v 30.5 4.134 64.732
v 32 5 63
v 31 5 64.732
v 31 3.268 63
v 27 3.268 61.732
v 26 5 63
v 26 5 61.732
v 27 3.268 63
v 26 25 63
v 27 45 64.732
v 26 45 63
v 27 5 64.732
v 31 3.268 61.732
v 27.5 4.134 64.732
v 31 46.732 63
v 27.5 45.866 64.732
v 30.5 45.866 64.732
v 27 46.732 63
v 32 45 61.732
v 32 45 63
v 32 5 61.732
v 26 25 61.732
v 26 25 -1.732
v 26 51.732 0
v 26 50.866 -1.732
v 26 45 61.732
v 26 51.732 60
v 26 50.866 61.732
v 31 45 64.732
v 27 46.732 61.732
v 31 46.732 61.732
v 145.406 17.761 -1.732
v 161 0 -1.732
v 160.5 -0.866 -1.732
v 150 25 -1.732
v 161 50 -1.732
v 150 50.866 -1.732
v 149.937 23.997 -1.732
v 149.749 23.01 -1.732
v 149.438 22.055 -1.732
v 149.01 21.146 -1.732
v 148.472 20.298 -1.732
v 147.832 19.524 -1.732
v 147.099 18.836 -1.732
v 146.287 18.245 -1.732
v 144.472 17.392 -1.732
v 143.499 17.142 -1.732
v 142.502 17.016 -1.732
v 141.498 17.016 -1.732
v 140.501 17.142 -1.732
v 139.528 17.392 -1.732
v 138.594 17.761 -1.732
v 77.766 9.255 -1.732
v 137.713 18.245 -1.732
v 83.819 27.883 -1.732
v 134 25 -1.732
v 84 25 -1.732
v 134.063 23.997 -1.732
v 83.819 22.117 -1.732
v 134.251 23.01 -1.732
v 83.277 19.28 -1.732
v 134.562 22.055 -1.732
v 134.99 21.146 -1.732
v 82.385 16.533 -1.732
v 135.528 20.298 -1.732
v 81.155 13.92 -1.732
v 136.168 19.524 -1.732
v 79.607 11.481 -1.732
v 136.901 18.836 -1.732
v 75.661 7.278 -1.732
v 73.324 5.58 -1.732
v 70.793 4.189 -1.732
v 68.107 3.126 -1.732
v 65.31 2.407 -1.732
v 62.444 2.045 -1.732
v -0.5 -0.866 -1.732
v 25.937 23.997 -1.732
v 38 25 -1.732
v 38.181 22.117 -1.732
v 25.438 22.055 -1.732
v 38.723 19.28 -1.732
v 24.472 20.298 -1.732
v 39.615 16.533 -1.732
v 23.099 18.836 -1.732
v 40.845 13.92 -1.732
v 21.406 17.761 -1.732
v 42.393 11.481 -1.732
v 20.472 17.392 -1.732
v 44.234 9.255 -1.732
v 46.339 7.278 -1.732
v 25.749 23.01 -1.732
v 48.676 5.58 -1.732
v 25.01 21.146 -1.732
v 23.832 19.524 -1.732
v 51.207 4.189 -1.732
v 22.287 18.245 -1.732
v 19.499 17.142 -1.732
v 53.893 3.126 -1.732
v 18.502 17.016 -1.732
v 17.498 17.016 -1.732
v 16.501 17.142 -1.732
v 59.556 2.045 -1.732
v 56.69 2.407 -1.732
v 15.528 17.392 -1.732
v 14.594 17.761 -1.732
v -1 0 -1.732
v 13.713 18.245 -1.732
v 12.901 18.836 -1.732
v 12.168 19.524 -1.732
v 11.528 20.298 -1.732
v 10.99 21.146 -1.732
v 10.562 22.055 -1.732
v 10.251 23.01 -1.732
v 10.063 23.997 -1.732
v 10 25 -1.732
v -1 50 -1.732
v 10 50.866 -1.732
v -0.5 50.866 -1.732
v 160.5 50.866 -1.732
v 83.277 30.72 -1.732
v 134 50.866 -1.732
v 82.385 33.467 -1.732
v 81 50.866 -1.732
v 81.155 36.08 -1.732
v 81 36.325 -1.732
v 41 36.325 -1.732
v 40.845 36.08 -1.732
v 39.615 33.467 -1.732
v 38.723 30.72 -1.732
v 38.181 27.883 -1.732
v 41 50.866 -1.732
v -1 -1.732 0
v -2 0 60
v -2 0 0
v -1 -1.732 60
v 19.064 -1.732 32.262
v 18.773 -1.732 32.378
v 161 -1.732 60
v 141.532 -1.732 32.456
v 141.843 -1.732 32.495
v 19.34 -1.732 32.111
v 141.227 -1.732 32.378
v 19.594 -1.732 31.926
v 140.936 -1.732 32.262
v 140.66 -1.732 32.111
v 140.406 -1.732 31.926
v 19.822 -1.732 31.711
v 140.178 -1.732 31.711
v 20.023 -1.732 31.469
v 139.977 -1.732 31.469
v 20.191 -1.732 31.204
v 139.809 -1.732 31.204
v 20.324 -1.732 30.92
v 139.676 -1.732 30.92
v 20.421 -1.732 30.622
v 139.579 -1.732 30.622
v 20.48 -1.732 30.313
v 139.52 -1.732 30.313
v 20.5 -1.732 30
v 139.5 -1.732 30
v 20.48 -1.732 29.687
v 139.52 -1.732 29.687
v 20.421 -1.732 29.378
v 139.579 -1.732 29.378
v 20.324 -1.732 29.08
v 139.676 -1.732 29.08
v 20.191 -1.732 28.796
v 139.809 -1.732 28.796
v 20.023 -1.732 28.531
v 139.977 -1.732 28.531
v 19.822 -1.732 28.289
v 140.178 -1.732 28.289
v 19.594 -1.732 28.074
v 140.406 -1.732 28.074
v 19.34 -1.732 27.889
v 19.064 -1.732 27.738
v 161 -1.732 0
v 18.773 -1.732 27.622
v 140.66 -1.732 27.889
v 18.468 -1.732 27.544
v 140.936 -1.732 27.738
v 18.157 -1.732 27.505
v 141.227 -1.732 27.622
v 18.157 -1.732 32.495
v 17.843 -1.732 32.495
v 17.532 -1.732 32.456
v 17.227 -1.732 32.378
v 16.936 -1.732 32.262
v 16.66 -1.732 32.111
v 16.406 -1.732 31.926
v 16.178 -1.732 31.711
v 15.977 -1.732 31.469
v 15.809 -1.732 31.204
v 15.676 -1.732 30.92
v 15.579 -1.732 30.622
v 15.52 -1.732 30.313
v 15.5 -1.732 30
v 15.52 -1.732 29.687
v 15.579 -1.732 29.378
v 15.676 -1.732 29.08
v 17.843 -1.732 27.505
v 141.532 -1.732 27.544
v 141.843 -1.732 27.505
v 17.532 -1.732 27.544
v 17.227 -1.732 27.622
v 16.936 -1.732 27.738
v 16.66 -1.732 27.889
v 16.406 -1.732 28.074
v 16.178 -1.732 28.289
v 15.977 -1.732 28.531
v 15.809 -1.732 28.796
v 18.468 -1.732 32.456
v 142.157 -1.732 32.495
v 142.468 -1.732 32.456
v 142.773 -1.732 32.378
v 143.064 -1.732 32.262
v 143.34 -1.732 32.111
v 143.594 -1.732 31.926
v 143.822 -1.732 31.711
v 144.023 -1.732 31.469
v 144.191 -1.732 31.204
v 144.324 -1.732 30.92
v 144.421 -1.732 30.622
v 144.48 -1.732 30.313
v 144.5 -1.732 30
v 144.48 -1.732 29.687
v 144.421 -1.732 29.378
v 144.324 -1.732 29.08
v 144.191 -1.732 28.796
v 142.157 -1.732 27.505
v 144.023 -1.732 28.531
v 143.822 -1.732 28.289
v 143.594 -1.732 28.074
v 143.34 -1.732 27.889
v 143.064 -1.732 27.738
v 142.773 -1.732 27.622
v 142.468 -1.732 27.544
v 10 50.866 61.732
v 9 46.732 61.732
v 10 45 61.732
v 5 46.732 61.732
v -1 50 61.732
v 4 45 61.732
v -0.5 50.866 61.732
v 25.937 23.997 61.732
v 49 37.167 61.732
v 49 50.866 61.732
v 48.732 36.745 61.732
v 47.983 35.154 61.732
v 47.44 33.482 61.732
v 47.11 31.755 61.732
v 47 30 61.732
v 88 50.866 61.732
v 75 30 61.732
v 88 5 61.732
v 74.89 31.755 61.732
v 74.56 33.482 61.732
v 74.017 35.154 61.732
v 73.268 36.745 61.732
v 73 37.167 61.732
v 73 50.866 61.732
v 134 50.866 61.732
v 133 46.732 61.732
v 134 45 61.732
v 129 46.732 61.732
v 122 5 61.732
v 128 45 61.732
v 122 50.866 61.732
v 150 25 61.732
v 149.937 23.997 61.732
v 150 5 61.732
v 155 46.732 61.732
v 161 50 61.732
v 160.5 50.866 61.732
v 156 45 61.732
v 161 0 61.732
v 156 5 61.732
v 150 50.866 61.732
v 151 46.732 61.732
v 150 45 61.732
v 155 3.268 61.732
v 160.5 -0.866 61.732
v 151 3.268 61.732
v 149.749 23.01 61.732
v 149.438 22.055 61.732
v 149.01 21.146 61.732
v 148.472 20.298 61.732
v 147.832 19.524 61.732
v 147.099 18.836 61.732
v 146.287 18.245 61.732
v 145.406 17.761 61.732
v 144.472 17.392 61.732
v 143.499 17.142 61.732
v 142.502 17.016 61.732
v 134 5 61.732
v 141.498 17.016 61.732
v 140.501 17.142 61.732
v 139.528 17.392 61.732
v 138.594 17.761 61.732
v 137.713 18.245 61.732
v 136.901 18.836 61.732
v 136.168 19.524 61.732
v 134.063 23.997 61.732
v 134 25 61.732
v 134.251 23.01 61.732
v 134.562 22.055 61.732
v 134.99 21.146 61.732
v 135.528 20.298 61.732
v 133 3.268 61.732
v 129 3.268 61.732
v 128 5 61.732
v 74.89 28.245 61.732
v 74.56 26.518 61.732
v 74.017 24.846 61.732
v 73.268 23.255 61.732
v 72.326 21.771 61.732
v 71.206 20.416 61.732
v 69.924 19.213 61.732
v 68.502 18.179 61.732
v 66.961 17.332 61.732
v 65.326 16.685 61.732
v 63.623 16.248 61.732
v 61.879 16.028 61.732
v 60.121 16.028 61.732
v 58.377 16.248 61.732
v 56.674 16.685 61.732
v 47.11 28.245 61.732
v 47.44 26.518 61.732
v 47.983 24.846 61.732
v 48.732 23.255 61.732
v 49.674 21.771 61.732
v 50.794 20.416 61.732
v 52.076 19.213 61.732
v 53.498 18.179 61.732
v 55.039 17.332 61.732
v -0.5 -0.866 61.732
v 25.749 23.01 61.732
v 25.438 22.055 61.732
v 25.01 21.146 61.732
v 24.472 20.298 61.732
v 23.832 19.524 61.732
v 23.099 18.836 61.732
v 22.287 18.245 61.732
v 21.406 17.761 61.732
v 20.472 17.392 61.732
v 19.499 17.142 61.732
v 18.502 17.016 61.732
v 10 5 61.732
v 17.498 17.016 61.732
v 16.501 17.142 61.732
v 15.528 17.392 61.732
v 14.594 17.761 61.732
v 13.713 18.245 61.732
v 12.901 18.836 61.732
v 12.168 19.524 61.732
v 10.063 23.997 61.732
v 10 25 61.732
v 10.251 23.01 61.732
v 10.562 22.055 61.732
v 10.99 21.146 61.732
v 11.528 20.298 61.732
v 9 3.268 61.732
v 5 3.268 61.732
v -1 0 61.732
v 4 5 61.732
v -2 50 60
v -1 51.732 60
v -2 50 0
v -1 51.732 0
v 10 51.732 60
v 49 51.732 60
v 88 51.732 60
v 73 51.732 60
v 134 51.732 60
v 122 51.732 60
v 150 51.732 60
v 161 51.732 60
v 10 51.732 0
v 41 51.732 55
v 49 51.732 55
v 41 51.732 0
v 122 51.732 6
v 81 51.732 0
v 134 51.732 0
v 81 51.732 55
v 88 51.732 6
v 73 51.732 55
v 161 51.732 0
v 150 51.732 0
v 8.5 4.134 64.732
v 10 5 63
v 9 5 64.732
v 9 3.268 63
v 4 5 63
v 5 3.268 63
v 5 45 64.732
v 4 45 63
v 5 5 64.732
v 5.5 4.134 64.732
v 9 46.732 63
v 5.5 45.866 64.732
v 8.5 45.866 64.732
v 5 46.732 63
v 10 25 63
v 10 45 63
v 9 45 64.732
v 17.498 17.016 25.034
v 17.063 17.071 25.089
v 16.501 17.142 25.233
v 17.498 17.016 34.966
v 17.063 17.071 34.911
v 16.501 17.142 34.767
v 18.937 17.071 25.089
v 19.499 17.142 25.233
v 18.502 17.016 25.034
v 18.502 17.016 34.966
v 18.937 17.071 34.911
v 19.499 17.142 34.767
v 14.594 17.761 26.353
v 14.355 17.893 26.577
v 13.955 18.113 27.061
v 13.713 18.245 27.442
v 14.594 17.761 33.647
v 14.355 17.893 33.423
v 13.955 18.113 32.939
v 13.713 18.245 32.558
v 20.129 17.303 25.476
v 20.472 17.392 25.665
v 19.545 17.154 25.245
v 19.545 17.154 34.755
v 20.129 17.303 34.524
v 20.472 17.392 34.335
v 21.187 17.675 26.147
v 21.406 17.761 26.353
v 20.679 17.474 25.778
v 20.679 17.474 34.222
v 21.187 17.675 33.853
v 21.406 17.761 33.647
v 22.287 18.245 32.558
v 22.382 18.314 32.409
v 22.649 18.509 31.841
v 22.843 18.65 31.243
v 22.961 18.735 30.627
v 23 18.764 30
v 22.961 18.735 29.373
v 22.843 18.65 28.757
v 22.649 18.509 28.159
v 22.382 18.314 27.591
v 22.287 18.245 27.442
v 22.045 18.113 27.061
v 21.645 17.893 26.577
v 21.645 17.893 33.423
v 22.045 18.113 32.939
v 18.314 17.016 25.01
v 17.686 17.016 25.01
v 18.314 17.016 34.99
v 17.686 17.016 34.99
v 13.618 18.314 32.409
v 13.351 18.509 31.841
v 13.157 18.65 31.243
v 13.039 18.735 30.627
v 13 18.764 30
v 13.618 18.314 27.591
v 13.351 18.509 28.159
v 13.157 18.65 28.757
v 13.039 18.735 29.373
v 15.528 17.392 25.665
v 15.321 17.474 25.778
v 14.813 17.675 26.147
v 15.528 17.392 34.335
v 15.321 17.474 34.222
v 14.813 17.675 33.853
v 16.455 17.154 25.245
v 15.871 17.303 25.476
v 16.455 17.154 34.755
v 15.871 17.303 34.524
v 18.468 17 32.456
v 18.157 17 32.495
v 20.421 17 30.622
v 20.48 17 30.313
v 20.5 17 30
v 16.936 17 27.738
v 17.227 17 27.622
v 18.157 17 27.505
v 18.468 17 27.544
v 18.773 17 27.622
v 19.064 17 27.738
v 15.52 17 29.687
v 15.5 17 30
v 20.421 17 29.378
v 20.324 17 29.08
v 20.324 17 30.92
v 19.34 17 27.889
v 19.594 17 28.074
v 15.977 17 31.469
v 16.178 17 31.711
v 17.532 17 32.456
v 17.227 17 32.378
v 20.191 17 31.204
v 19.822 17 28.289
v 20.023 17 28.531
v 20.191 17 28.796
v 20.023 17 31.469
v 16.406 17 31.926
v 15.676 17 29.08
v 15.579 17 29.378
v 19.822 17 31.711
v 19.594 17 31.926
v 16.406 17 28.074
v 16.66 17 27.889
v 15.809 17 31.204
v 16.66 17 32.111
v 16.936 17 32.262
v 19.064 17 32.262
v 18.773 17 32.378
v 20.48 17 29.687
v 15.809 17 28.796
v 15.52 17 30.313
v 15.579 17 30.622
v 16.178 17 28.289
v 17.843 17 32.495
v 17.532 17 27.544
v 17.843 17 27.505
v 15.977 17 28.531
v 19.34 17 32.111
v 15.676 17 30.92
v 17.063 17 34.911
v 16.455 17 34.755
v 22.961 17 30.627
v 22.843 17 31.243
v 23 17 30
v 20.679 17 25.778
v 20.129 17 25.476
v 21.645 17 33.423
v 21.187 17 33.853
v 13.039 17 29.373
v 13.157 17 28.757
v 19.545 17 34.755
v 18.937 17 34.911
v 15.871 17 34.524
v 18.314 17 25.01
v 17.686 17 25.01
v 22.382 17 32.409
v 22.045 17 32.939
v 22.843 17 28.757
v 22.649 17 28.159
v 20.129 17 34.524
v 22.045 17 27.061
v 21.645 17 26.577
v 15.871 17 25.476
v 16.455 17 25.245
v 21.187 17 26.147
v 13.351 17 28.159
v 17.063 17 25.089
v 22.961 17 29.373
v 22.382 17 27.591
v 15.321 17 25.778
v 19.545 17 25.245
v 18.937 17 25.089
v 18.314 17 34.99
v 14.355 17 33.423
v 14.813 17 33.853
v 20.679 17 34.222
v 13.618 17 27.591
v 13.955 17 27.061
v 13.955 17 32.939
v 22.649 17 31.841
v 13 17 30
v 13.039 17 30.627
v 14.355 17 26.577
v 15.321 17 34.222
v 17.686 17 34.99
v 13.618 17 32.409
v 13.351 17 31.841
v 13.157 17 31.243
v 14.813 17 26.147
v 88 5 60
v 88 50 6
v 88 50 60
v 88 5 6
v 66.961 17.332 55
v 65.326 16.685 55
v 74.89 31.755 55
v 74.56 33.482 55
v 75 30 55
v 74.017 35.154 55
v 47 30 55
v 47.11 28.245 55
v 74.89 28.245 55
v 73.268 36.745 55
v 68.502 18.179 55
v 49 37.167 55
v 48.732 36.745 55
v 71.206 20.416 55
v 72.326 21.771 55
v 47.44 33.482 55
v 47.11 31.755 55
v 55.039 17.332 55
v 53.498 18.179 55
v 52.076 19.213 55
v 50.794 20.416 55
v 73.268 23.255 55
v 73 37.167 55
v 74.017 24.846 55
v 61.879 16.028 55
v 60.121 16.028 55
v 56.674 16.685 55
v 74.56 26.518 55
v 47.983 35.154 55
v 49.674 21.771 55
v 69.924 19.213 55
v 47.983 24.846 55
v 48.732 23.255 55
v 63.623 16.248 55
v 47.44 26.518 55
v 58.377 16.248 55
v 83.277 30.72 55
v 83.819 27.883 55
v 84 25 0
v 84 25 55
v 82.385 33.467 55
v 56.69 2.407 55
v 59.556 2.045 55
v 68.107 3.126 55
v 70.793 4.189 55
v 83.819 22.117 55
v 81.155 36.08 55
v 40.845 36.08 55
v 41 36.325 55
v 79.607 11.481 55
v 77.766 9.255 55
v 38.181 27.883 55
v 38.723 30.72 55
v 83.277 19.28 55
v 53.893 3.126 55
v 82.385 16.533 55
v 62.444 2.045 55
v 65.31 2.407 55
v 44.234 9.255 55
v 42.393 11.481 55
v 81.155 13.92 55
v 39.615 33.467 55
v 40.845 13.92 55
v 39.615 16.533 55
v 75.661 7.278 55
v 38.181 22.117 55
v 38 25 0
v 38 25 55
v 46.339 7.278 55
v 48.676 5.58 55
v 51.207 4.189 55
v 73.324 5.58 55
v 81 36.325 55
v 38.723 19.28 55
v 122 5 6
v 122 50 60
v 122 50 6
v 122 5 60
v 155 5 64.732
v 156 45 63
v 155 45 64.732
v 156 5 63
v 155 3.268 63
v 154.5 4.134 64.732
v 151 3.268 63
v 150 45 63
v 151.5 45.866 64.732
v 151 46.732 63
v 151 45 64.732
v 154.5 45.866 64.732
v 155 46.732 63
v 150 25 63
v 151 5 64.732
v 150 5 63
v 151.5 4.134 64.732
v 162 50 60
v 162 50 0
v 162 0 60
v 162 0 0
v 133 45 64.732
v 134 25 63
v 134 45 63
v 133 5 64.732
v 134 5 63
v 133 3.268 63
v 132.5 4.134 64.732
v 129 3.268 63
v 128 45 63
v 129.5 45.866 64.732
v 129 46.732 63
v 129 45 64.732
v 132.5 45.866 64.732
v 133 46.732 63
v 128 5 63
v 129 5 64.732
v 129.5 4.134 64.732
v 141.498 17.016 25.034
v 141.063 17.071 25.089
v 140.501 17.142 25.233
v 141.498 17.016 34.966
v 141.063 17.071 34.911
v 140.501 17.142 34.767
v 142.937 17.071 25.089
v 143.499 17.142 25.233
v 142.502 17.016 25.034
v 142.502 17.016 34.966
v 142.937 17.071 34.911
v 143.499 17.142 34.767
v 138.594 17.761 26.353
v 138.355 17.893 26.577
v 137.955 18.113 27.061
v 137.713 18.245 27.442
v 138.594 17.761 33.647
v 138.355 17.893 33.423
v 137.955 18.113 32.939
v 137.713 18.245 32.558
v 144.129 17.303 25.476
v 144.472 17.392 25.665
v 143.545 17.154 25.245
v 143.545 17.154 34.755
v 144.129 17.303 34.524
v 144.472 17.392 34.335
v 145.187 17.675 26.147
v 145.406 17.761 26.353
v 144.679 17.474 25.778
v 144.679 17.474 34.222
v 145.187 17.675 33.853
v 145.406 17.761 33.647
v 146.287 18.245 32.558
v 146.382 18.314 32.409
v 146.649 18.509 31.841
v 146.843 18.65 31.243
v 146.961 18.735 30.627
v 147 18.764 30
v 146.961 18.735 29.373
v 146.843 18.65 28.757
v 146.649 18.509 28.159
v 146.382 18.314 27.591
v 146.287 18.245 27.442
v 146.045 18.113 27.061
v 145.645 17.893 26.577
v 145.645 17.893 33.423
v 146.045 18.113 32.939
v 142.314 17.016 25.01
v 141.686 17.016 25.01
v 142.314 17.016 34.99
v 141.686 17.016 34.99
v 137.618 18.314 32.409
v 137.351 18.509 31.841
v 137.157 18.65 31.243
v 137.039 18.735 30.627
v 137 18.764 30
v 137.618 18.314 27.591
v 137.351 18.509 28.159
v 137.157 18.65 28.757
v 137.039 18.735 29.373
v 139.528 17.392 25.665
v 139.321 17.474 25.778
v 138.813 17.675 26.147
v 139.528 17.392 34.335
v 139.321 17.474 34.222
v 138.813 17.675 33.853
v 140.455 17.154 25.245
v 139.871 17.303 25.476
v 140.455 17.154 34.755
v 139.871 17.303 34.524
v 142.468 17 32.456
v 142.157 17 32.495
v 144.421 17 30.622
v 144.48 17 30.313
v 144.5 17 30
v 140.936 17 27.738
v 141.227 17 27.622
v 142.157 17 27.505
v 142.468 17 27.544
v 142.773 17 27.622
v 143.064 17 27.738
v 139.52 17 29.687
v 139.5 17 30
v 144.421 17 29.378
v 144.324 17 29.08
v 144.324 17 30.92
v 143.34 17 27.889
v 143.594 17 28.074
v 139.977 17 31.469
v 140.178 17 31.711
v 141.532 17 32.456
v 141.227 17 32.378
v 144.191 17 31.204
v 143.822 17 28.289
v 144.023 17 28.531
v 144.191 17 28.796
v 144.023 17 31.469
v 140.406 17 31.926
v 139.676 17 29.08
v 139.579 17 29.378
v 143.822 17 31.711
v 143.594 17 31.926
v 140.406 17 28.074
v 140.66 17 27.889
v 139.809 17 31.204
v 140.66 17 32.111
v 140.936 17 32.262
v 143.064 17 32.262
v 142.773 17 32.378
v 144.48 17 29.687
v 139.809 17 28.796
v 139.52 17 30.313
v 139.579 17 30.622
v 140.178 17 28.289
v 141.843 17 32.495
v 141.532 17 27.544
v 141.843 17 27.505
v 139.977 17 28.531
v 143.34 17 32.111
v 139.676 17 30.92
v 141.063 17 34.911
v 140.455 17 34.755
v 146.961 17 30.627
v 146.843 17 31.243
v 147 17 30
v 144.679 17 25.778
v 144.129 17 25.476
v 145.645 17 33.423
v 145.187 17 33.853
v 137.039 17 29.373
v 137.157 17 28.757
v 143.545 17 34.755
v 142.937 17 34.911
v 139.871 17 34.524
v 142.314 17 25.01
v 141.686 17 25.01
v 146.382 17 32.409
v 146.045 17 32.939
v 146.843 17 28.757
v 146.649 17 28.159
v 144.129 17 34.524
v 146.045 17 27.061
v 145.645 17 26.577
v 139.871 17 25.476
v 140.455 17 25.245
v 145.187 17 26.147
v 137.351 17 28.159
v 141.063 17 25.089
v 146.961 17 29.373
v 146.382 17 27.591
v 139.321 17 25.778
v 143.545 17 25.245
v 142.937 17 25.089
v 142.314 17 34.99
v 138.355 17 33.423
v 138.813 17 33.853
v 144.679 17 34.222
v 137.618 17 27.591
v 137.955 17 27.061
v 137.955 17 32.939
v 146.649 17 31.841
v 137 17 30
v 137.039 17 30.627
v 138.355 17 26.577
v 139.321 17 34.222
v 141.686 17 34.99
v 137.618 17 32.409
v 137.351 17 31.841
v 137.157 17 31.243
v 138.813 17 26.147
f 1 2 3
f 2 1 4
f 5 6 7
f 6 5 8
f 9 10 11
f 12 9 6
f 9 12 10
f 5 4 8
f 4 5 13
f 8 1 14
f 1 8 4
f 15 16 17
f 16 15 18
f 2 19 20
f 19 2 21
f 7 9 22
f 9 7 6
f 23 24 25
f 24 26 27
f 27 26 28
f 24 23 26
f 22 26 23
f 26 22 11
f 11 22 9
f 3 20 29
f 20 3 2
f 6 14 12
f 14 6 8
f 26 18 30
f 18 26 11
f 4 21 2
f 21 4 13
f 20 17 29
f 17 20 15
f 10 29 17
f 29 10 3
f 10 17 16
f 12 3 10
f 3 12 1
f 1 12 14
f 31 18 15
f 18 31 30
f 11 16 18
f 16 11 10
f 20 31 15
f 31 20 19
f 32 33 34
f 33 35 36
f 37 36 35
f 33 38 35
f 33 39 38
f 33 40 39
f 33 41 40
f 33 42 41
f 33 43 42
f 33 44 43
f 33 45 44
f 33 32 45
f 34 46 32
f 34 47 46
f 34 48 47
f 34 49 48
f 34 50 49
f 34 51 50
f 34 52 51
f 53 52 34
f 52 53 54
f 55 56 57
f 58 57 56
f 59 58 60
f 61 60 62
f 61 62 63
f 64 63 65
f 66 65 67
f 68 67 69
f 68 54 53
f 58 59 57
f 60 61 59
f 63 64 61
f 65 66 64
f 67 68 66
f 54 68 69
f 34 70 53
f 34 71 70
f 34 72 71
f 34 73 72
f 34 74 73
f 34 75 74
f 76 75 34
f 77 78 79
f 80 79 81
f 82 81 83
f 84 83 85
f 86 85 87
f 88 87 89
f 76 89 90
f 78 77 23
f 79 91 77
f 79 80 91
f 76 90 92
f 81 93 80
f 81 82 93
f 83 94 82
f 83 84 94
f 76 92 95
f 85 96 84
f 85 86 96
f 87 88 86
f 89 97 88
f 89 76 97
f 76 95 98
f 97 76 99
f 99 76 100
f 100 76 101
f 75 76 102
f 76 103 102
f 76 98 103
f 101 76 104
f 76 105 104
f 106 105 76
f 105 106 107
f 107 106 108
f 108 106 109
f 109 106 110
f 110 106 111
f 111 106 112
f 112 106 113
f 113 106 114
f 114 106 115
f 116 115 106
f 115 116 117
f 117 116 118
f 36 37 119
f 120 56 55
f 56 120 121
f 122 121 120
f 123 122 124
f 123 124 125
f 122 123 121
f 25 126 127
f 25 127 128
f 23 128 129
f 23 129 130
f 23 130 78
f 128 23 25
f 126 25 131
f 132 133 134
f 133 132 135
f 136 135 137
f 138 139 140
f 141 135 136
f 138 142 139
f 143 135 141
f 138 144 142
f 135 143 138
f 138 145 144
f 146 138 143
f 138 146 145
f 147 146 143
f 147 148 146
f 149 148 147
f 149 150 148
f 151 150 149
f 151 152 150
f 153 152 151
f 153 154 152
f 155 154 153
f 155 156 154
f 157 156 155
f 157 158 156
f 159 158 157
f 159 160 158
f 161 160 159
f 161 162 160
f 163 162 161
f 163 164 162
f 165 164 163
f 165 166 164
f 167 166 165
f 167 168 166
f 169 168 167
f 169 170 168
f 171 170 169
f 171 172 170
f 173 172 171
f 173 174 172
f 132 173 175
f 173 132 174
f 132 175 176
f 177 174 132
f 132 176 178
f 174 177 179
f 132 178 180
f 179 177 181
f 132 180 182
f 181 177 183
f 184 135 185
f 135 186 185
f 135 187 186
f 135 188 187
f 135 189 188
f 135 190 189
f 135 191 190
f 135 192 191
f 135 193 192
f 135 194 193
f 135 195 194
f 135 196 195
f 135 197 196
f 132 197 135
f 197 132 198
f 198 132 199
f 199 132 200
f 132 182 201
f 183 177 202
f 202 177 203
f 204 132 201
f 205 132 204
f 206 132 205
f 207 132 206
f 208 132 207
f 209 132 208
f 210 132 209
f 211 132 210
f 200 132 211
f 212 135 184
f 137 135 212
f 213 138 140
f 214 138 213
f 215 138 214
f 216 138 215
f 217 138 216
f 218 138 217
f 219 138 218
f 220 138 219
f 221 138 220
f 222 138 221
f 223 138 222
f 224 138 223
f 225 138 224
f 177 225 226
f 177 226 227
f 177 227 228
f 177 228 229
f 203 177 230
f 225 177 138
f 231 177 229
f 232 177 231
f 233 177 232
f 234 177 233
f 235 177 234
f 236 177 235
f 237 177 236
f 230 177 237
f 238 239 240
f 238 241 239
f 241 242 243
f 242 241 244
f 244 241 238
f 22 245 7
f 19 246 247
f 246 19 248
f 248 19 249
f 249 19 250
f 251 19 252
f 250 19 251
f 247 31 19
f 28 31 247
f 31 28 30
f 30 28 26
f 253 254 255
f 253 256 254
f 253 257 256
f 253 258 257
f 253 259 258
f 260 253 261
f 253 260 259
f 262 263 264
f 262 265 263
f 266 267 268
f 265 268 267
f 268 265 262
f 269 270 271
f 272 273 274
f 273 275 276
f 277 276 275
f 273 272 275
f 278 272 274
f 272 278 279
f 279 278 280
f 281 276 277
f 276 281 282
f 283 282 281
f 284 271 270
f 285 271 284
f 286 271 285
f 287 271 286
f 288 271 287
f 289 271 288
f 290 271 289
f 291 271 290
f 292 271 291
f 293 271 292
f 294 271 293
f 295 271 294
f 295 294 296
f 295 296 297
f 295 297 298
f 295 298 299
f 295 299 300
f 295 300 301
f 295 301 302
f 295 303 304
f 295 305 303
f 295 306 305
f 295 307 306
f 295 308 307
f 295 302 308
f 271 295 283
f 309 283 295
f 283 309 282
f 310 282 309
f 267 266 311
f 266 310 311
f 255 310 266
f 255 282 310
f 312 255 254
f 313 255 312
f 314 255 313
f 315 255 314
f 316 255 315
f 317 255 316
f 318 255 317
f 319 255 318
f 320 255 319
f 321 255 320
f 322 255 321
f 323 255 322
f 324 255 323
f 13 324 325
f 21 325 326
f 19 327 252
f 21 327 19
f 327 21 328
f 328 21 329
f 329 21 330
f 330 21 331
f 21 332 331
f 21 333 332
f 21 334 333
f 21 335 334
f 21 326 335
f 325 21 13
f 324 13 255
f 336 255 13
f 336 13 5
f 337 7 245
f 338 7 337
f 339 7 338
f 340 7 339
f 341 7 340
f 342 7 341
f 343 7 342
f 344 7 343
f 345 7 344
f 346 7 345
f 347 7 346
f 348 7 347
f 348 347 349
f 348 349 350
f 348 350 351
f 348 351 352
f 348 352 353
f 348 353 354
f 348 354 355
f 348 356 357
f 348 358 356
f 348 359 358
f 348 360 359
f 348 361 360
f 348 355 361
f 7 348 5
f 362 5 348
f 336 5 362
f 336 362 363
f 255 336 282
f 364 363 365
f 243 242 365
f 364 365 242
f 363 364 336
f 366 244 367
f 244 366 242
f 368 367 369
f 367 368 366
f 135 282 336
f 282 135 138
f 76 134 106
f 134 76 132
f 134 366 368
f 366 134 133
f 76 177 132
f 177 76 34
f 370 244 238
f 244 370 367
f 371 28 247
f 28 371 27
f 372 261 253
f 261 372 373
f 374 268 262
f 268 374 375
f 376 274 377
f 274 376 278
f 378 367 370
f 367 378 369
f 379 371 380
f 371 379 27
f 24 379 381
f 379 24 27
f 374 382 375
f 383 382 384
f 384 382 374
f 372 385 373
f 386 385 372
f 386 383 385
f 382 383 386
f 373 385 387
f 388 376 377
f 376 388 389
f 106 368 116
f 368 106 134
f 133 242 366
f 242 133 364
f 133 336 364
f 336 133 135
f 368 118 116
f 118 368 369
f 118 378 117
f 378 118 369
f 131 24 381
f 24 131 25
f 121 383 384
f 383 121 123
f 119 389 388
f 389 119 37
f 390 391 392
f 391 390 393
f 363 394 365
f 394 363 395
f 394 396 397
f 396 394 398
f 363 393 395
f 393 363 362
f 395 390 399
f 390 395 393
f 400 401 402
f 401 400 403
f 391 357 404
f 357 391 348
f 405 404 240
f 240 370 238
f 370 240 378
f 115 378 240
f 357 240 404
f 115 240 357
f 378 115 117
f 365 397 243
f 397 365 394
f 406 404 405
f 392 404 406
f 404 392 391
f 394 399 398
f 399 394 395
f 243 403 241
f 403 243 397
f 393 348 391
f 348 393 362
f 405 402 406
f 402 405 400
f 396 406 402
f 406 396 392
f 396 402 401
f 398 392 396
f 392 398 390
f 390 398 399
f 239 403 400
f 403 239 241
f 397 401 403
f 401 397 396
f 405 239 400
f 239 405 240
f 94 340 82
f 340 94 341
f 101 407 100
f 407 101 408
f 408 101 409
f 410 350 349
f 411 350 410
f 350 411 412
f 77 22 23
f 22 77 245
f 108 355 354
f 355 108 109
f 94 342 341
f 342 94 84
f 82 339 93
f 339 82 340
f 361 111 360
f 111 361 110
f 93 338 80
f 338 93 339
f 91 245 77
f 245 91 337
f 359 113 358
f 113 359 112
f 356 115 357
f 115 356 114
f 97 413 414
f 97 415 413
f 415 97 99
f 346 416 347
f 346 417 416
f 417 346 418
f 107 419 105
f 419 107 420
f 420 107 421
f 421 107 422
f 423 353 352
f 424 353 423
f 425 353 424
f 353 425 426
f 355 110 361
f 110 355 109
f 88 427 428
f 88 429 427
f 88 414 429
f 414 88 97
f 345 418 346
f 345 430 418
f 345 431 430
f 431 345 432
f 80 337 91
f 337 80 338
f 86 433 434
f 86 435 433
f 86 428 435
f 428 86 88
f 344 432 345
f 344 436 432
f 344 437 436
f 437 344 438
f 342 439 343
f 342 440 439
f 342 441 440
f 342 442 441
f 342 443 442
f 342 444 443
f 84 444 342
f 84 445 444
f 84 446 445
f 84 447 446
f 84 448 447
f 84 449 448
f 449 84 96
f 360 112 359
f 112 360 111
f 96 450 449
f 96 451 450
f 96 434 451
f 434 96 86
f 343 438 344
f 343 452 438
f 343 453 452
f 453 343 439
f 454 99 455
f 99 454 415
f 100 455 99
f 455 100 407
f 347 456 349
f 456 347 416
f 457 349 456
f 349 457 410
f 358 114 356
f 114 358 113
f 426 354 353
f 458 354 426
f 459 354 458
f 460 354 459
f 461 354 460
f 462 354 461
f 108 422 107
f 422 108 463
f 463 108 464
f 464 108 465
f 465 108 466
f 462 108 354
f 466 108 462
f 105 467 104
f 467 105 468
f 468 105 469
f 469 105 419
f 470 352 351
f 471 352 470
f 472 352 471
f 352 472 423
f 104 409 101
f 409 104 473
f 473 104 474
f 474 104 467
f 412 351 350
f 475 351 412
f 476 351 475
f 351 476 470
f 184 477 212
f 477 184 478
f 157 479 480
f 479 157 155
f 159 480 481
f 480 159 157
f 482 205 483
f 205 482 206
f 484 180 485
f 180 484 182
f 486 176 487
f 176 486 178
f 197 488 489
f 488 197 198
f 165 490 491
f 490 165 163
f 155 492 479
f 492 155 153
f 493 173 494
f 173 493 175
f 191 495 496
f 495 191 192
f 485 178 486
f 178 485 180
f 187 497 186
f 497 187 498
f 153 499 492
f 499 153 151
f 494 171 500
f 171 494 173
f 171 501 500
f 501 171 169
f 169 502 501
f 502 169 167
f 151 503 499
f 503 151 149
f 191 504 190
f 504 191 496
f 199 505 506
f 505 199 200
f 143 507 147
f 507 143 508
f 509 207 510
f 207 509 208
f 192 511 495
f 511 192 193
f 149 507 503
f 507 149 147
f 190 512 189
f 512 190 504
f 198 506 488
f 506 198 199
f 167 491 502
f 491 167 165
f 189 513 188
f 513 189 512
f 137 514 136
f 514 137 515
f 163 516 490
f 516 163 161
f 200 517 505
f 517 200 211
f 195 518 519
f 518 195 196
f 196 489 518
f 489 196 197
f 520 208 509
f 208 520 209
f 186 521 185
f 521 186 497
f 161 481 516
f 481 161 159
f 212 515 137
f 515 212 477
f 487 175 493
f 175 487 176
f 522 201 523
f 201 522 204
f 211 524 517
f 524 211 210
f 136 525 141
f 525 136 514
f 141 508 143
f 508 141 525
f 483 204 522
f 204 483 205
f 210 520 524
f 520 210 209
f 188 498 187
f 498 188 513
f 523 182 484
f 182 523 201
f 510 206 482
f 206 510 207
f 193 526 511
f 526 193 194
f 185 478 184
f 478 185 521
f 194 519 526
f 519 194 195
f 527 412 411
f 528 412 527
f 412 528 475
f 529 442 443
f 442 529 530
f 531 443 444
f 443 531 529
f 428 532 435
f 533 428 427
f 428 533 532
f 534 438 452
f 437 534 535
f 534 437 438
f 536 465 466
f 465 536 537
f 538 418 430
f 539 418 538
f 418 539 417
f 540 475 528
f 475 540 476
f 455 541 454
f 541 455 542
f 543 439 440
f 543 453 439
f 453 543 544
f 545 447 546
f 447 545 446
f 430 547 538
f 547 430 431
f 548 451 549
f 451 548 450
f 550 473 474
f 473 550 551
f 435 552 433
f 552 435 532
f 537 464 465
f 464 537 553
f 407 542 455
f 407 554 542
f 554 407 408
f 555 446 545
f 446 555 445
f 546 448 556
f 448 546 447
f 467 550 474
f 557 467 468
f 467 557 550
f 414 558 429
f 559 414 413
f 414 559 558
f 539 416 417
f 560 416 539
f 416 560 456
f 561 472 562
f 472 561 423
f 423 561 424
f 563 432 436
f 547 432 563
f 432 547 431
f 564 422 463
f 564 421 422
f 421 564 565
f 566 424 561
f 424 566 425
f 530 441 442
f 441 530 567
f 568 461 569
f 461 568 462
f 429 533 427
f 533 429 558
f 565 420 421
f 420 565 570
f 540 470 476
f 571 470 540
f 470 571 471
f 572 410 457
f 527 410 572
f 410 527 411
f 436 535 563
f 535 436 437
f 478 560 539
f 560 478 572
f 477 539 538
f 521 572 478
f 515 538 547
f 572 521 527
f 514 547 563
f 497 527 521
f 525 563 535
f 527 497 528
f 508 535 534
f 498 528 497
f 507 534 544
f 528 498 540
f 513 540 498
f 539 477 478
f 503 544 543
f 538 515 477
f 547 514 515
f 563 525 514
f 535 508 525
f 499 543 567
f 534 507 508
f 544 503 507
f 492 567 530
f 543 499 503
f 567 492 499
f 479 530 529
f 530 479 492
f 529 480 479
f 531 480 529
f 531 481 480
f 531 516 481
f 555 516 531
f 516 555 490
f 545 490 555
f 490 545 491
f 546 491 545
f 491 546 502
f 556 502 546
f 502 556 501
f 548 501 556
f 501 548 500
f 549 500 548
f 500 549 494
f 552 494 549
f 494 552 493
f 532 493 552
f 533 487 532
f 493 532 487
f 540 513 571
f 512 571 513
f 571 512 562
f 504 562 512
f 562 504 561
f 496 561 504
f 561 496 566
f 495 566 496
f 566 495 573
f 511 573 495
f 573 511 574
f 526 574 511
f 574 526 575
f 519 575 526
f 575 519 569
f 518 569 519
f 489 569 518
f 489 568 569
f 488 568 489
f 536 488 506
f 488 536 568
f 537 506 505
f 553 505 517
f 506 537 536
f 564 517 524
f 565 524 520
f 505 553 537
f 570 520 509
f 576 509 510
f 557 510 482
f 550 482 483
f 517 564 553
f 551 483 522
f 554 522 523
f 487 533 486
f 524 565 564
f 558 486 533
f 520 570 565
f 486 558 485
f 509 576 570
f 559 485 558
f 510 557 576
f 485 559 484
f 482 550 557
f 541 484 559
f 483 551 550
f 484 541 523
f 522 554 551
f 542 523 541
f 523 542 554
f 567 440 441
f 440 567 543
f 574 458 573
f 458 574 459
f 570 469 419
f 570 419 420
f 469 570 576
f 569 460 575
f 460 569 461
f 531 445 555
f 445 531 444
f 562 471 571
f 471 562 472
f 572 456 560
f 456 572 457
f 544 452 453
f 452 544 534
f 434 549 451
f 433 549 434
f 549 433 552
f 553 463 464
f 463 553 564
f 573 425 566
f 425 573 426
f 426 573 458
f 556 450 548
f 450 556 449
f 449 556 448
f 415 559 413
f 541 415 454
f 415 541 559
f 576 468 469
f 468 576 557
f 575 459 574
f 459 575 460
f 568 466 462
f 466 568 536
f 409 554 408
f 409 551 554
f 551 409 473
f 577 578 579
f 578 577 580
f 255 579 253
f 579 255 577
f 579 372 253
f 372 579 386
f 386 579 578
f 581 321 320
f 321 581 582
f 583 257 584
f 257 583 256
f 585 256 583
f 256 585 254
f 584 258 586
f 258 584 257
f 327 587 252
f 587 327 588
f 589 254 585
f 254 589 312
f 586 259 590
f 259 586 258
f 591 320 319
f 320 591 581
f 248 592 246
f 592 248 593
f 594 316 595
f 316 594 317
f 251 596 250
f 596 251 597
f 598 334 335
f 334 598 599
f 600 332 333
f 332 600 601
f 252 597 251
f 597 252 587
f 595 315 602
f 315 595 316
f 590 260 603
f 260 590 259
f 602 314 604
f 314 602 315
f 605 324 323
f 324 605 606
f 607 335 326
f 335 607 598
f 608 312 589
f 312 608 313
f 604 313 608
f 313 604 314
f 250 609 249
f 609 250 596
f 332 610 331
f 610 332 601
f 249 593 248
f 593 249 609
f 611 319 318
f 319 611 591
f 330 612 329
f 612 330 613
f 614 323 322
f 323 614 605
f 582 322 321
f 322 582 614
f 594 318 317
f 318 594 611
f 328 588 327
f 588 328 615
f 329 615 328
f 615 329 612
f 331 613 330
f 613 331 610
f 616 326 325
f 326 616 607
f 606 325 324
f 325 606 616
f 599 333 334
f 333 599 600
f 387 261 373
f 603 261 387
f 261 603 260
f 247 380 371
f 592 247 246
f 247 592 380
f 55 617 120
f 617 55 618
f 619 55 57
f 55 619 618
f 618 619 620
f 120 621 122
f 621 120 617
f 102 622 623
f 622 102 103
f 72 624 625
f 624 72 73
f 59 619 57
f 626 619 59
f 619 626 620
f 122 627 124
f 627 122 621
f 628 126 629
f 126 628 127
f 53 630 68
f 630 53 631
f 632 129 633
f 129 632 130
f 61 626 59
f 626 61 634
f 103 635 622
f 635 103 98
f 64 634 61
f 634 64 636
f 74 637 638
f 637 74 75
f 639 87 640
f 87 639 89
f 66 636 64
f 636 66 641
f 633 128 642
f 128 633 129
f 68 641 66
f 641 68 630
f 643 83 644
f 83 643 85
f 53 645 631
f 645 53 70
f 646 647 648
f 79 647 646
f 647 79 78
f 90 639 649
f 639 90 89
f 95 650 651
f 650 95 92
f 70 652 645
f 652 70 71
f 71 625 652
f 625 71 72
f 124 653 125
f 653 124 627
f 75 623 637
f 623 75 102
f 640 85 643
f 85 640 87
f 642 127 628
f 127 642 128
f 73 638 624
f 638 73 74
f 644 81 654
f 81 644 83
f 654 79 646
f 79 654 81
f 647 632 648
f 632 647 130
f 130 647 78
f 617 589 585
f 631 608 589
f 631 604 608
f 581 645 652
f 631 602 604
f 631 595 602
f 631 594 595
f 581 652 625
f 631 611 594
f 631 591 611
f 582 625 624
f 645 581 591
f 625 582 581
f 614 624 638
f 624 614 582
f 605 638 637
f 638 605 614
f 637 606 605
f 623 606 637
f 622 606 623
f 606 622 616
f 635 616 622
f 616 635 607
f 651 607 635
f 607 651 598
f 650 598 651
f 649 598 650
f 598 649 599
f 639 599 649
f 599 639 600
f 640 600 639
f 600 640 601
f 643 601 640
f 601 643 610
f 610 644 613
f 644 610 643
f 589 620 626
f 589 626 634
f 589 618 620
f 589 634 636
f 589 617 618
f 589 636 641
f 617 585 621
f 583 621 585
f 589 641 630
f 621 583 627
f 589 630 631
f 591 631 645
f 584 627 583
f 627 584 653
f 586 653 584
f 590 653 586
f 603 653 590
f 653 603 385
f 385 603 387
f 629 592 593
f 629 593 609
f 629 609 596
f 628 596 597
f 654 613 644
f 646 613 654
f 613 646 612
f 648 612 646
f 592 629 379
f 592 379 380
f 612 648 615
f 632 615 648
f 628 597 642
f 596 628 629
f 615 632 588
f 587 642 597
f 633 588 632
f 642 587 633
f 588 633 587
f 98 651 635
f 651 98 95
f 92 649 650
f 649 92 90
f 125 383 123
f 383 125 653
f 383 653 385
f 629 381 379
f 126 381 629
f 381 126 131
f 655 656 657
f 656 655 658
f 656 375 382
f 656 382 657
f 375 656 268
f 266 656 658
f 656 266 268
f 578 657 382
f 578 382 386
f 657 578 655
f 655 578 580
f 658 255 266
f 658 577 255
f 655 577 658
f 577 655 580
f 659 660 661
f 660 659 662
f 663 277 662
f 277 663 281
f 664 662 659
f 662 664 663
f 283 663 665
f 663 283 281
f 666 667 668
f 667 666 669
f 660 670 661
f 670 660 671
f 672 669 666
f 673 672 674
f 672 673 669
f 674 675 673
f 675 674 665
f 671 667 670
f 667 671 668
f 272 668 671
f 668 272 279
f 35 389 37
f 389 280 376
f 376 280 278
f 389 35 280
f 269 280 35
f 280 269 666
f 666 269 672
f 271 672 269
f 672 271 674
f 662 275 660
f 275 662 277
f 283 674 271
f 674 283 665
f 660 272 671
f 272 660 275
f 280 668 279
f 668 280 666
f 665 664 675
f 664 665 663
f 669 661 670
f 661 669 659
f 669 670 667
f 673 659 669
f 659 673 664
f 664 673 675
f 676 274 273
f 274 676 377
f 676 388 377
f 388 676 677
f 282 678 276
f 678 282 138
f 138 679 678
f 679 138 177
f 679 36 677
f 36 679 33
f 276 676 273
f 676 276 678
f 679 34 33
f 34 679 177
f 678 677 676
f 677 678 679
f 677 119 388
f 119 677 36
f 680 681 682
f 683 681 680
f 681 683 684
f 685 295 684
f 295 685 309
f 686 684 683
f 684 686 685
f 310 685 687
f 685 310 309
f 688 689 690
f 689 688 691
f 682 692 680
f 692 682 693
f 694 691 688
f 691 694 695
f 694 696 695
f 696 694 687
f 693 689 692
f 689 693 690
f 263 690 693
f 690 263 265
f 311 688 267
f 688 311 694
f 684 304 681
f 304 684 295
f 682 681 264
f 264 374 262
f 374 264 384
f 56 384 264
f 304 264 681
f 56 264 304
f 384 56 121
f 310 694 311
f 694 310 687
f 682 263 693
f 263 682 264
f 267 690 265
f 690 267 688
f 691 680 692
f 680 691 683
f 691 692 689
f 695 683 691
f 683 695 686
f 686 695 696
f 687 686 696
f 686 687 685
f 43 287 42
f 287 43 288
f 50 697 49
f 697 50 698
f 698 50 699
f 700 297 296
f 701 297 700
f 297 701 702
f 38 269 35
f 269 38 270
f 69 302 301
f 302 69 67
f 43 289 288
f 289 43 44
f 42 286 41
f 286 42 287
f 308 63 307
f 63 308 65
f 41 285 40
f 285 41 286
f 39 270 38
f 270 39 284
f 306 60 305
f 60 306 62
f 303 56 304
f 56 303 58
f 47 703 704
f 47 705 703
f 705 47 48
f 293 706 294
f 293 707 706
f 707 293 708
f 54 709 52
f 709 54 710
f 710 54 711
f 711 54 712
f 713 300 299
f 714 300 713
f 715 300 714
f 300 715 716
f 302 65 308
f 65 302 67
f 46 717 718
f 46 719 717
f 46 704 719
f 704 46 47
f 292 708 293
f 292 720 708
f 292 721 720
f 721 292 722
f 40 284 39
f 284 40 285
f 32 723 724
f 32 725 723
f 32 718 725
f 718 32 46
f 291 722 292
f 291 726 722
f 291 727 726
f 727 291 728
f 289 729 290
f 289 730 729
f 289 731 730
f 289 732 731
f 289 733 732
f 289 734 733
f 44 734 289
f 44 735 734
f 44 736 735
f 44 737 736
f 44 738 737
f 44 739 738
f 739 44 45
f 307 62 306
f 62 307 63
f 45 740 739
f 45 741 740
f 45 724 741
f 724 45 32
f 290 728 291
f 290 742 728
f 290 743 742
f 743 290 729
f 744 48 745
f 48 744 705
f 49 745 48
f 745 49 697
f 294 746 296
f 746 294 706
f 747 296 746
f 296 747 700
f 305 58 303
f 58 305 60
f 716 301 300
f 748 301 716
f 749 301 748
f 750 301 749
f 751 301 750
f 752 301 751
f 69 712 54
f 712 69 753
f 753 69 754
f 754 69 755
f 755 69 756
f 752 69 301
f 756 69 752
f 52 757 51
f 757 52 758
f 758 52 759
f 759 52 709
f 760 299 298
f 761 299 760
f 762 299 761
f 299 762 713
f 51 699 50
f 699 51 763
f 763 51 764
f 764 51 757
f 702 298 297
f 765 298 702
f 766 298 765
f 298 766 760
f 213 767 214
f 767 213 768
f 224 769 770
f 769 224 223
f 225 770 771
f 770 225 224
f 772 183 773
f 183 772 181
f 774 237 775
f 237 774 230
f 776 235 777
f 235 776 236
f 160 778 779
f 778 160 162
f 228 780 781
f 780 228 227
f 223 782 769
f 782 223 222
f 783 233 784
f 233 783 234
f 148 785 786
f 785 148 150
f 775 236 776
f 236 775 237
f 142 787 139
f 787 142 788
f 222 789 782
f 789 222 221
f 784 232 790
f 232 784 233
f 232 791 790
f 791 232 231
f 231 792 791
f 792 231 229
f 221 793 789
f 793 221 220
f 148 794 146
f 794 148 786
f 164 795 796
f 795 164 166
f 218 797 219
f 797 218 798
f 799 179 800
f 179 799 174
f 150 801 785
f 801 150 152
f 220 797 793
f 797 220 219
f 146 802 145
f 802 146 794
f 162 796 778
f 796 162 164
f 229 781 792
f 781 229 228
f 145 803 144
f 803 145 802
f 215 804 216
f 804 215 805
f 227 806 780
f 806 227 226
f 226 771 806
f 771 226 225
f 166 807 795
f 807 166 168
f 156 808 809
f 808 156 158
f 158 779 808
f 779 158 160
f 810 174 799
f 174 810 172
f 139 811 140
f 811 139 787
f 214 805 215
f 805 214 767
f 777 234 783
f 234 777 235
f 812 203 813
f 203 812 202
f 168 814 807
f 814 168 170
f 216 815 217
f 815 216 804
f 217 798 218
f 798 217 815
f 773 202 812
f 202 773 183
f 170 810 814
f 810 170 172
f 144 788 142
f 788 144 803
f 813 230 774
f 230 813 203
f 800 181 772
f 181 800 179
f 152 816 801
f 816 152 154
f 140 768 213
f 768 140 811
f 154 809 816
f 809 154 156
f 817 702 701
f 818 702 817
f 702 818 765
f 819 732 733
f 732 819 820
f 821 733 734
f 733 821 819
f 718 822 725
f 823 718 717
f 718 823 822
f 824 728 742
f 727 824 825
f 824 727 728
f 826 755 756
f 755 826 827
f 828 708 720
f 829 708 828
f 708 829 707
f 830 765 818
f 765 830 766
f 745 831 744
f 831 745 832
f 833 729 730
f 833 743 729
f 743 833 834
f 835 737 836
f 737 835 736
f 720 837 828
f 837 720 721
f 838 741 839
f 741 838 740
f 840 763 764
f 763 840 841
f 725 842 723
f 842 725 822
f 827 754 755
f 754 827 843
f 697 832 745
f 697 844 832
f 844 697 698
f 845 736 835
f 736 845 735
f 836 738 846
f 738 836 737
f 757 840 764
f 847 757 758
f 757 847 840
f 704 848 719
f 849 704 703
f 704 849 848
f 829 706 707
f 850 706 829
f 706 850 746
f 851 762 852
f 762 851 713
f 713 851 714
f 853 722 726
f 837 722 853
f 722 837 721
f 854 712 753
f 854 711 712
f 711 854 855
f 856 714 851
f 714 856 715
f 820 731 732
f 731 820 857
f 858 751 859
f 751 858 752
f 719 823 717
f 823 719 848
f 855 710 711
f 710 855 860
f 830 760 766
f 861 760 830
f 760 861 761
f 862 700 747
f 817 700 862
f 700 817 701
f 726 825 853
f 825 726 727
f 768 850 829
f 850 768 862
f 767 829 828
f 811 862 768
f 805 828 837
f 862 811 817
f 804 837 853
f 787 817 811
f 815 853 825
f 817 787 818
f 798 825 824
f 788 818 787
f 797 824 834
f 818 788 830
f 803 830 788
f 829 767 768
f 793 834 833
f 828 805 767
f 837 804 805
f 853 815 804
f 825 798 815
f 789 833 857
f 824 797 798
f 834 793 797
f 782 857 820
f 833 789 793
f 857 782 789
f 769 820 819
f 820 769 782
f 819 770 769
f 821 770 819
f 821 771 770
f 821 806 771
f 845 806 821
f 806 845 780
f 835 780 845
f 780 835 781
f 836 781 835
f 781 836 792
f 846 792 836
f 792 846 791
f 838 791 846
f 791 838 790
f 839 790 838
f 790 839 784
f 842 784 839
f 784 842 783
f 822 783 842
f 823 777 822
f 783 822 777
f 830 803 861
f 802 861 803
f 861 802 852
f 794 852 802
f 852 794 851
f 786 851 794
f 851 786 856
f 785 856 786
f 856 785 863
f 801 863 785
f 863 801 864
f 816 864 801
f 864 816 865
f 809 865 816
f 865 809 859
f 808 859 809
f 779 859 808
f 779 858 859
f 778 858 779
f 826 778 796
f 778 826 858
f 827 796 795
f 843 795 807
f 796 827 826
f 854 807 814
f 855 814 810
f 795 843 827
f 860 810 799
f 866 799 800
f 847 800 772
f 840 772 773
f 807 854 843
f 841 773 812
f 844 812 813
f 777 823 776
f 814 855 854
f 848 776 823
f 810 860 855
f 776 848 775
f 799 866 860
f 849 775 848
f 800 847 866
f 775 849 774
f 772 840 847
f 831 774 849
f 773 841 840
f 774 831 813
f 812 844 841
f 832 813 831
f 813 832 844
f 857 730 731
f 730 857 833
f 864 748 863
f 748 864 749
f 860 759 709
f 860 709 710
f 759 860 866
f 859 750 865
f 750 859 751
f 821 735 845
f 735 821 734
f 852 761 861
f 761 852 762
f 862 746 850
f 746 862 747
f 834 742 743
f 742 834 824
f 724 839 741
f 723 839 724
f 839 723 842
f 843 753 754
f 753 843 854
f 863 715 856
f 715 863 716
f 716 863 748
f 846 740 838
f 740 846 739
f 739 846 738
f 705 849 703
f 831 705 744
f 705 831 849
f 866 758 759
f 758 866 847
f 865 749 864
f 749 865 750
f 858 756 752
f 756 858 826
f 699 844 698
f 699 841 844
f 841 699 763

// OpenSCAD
//Wall holder for double edged razor and accessories
//Modules for each stage to allow customisation

// preview[view:north east, tilt:top diagonal]


/*[Parameters]*/
//Edge Rounding figure - to minimise server resources this is limited online, but if you want radii rather than fillets download the code and run on your machine
$fn=6; //[6:2:8];

//Part to be made
part=0; //[0:Wall Holder, 1:Old Blade box Full Height, 2: Old Blade Box Half Height, 3:Old Blade Box Lid]
//Depth of unit
D=50; //[50:5:80]
//Height of unit
H=60; //[40:5:80]
//Module One - Must be a razor holder for screw hole
Mod1=36; //[36:Razor,36:Razor]
//Module Two
Mod2=50; //[0:None,36:Razor,50:Brush,38:Blades Slot]
//Module Three
Mod3=38; //[0:None,36:Razor,50:Brush,38:Blades Slot]
//Module Four
Mod4=0; //[0:None,36:Razor,50:Brush,38:Blades Slot]
//Module Five
Mod5=0; //[0:None,36:Razor,50:Brush,38:Blades Slot]
//Module Six
Mod6=0; //[0:None,36:Razor,50:Brush,38:Blades Slot]
//Last Module - Must be a Razor for screw hole
Mod7=36;//[36:Razor,36:Razor]

/*[Hidden]*/
//Work out offsets
P1=0;
P2=Mod1;
P3=Mod1+Mod2;
P4=Mod1+Mod2+Mod3;
P5=Mod1+Mod2+Mod3+Mod4;
P6=Mod1+Mod2+Mod3+Mod4+Mod5;
P7=Mod1+Mod2+Mod3+Mod4+Mod5+Mod6;

if((part==0)) { //Making the main wall mount
    
    //Module 1 (Always a Razor)
    Razor(P1); //36mm wide
    
    //Module 2
    if((Mod2==36)) Razor(P2);
    if((Mod2==38)) New_Blades(P2);
    if((Mod2==50)) Brush(P2);
    
    //Module 3
    if((Mod3==36)) Razor(P3);
    if((Mod3==38)) New_Blades(P3);
    if((Mod3==50)) Brush(P3);
    
    //Module 4
    if((Mod4==36)) Razor(P4);
    if((Mod4==38)) New_Blades(P4);
    if((Mod4==50)) Brush(P4);
    
    //Module 5
    if((Mod5==36)) Razor(P5);
    if((Mod5==38)) New_Blades(P5);
    if((Mod5==50)) Brush(P5);
    
    //Module 6
    if((Mod6==36)) Razor(P6);
    if((Mod6==38)) New_Blades(P6);
    if((Mod6==50)) Brush(P6);

    //End module (always a Razor)
    Razor(P7); //36mm wide
}

if((part==1)) { //Making Full Height Old Razor Blade Box
Old_Blades_Box(1);
}

if((part==2)) { //Making Half Height Old Razor Blade Box
Old_Blades_Box(0.5);
}

if((part==3)) { //Making Old Razor Blade Box Lid
Old_Blades_Lid();
}
module Razor(Offset) { //Offset is how far along to have the item
    
    // Module that ads a razor holder to the assembly, 36mm wide
    difference(){
        minkowski(){
            union(){
                translate([Offset,0,0]) cube([36,D,H]);
                translate([(Offset+6),5,0]) cube([2,(D-10),(H+3)]);
                translate([(Offset+28),5,0]) cube([2,(D-10),(H+3)]);
            }
            sphere(2);
        }
        translate([(Offset+18),(D/2),-2]) cylinder(r=8,(H+5),$fn=50);
        translate([(Offset+10),(D/2),-2]) cube([16,((D/2)+4),(H+5)]);
        //Screwholes to avoid use of seperate module
        translate([(Offset+18),(D+2),(H/2)]) rotate([90,0,0]) cylinder(r=2.5,h=(D+5),$fn=50); //screwhole
        translate([(Offset+18),(D+2),(H/2)]) rotate([90,0,0]) cylinder(r=5,h=(D-15),$fn=50); //counterbore
     
     }
}    

module Brush(Offset) { //Offset is how far along to have the item
    
    // Module that adds a brush holder to the assembly, 50mm wide
    difference(){
        minkowski(){
            union(){
                translate([Offset,0,0]) cube([50,D,H]);
            }
            sphere(2);
        }
        translate([(Offset+25),((D/2)+5),-2]) cylinder(r=14,(H+5),$fn=50);
        translate([(Offset+13),(D/2),-2]) cube([24,((D/2)+4),(H+5)]);
        translate([(Offset+25),(D/2),-2]) cylinder(r=23,(H-3),$fn=50);
        translate([(Offset+5),(D/2),-2]) cube([40,((D/2)+4),(H-3)]);


    }
}  
         
module New_Blades(Offset) { //Offset is how far along to have the item
    
    // Module that adds a section to store packs of new blades 36mm wide
    difference(){
        minkowski(){
            union(){
                translate([Offset,0,0]) cube([38,D,H]);
            }
            sphere(2);
        }
        translate([(Offset+2),5,6]) cube([34,(D+4),(H+3)]);

    }
}  

module Old_Blades_Box(Scale) {
  //Used blade holder
  // Box to be able to dispose of old blades that sits below packs of new blades in the holder system
  //Razor blades are 24mm wide by 45mm long, opening is 34mm wide
  //This will spit out 3 parts, a full size box, a half height box and a common lid

Box_Height=(H-10)*Scale;

// Base
difference(){
    minkowski(){
        cube([26,47,Box_Height]);
        sphere(2);
    }
    // Cut off top
    translate([-2.1,-2.1,(Box_Height-3)]) cube([42,60.2,5]);
    //Hollow out
    translate([0,0,0]) cube([26,47,Box_Height+3]);
    //Front Opening
    translate([0,-2,Box_Height-6]) cube([26,10,6]);
}
}

module Old_Blades_Lid(){
//Lid

translate([-40,0,0]) difference(){
    minkowski(){
        cube([26,47,2]);
        sphere(2);
    }
    // Cut off top
    translate([-2,-2,1]) cube([30,51,5]);
    
    
}
//Locating face
    #translate([-39.8,0.2,0]) cube([25.6,46.6,2.5]);
}
